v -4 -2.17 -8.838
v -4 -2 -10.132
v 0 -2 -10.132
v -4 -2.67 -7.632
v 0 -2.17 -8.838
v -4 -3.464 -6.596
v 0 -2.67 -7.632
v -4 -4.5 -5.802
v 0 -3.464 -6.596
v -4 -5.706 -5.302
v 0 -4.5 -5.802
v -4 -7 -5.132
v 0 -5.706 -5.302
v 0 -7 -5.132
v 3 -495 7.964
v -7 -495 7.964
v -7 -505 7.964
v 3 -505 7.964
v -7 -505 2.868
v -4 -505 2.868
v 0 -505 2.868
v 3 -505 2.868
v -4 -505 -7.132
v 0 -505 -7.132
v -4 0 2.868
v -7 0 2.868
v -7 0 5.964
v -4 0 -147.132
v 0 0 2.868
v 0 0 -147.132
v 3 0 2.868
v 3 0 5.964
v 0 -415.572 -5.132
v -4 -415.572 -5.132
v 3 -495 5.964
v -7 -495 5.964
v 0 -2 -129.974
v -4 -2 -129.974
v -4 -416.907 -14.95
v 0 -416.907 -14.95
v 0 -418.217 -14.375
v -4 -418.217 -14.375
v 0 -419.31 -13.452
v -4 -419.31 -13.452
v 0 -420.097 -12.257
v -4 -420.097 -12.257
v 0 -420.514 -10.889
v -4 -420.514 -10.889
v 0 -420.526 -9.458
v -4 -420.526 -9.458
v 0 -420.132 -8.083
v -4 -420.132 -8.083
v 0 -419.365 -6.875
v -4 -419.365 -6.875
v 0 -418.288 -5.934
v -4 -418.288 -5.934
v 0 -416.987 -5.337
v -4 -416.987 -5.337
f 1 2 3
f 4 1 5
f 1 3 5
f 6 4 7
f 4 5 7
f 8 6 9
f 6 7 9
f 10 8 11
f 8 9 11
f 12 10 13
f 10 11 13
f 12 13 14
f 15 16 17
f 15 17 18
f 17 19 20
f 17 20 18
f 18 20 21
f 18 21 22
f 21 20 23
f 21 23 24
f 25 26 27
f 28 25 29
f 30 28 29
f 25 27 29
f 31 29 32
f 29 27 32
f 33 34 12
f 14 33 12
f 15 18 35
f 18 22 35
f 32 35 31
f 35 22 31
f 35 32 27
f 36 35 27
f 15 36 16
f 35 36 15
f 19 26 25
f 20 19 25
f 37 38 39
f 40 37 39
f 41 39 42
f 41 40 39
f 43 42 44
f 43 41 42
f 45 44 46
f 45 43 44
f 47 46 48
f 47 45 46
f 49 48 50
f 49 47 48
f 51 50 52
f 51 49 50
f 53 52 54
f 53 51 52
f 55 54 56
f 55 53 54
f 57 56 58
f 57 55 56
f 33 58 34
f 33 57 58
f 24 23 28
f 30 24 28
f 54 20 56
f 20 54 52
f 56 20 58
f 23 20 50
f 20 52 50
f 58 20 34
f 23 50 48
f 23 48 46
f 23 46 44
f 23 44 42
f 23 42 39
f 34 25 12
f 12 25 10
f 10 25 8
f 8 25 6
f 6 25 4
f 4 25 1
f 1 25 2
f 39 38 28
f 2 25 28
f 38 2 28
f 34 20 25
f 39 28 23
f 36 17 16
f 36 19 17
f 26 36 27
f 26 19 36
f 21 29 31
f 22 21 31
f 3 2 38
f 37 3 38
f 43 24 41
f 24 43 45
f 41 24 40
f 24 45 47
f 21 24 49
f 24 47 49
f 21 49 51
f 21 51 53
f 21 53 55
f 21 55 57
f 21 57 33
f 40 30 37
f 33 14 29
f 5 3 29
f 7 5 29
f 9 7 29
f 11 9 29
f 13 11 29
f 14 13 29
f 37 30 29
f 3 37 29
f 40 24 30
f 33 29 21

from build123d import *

# Parameters (mm, degrees)
F1_DEPTH = 505
F2_W     = 10
F2_H     = 10
F3_DEPTH = 2
F5_DEPTH = 25
F7_DEPTH = 25
F8_R     = 5


with BuildPart() as f1:
    # F0 (on Front) → F1 (new body)
    with BuildSketch(Plane.XZ):
        Polygon((3, 5.9644671453), (-7, 5.9644671453), (-7, 2.8680202551), (-4, 2.8680202551), (-4, -147.1319797449), (0, -147.1319797449), (0, 2.8680202551), (3, 2.8680202551), align=None)
    extrude(amount=F1_DEPTH)

    # F2 (on face) → F3 (join)
    with BuildSketch(Plane.XY.offset(5.9644671453)):
        with Locations((-2, -500)):
            Rectangle(F2_W, F2_H)
    extrude(amount=F3_DEPTH)

    # F4 (on face) → F5 (cut)
    with BuildSketch(Plane(origin=(-4, 0, 0), x_dir=(0, -1, 0), z_dir=(-1, 0, 0))):
        Polygon((505, -147.1319797449), (505, -7.1319797449), (0, -147.1319797449), align=None)
    extrude(amount=-F5_DEPTH, mode=Mode.SUBTRACT)

    # F6 (on face) → F7 (cut)
    with BuildSketch(Plane(origin=(-4, 0, 0), x_dir=(0, -1, 0), z_dir=(-1, 0, 0))):
        Polygon((452.3232281555, -5.1319797449), (2, -5.1319797449), (2, -129.9740627979), align=None)
    extrude(amount=-F7_DEPTH, mode=Mode.SUBTRACT)

    # F8
    f8_edges = [f1.edges().sort_by_distance(p)[0] for p in [
        (-2, -2, -5.13198),
        (-2, -452.323228, -5.13198),
    ]]
    fillet(f8_edges, radius=F8_R)


solid = f1.part
